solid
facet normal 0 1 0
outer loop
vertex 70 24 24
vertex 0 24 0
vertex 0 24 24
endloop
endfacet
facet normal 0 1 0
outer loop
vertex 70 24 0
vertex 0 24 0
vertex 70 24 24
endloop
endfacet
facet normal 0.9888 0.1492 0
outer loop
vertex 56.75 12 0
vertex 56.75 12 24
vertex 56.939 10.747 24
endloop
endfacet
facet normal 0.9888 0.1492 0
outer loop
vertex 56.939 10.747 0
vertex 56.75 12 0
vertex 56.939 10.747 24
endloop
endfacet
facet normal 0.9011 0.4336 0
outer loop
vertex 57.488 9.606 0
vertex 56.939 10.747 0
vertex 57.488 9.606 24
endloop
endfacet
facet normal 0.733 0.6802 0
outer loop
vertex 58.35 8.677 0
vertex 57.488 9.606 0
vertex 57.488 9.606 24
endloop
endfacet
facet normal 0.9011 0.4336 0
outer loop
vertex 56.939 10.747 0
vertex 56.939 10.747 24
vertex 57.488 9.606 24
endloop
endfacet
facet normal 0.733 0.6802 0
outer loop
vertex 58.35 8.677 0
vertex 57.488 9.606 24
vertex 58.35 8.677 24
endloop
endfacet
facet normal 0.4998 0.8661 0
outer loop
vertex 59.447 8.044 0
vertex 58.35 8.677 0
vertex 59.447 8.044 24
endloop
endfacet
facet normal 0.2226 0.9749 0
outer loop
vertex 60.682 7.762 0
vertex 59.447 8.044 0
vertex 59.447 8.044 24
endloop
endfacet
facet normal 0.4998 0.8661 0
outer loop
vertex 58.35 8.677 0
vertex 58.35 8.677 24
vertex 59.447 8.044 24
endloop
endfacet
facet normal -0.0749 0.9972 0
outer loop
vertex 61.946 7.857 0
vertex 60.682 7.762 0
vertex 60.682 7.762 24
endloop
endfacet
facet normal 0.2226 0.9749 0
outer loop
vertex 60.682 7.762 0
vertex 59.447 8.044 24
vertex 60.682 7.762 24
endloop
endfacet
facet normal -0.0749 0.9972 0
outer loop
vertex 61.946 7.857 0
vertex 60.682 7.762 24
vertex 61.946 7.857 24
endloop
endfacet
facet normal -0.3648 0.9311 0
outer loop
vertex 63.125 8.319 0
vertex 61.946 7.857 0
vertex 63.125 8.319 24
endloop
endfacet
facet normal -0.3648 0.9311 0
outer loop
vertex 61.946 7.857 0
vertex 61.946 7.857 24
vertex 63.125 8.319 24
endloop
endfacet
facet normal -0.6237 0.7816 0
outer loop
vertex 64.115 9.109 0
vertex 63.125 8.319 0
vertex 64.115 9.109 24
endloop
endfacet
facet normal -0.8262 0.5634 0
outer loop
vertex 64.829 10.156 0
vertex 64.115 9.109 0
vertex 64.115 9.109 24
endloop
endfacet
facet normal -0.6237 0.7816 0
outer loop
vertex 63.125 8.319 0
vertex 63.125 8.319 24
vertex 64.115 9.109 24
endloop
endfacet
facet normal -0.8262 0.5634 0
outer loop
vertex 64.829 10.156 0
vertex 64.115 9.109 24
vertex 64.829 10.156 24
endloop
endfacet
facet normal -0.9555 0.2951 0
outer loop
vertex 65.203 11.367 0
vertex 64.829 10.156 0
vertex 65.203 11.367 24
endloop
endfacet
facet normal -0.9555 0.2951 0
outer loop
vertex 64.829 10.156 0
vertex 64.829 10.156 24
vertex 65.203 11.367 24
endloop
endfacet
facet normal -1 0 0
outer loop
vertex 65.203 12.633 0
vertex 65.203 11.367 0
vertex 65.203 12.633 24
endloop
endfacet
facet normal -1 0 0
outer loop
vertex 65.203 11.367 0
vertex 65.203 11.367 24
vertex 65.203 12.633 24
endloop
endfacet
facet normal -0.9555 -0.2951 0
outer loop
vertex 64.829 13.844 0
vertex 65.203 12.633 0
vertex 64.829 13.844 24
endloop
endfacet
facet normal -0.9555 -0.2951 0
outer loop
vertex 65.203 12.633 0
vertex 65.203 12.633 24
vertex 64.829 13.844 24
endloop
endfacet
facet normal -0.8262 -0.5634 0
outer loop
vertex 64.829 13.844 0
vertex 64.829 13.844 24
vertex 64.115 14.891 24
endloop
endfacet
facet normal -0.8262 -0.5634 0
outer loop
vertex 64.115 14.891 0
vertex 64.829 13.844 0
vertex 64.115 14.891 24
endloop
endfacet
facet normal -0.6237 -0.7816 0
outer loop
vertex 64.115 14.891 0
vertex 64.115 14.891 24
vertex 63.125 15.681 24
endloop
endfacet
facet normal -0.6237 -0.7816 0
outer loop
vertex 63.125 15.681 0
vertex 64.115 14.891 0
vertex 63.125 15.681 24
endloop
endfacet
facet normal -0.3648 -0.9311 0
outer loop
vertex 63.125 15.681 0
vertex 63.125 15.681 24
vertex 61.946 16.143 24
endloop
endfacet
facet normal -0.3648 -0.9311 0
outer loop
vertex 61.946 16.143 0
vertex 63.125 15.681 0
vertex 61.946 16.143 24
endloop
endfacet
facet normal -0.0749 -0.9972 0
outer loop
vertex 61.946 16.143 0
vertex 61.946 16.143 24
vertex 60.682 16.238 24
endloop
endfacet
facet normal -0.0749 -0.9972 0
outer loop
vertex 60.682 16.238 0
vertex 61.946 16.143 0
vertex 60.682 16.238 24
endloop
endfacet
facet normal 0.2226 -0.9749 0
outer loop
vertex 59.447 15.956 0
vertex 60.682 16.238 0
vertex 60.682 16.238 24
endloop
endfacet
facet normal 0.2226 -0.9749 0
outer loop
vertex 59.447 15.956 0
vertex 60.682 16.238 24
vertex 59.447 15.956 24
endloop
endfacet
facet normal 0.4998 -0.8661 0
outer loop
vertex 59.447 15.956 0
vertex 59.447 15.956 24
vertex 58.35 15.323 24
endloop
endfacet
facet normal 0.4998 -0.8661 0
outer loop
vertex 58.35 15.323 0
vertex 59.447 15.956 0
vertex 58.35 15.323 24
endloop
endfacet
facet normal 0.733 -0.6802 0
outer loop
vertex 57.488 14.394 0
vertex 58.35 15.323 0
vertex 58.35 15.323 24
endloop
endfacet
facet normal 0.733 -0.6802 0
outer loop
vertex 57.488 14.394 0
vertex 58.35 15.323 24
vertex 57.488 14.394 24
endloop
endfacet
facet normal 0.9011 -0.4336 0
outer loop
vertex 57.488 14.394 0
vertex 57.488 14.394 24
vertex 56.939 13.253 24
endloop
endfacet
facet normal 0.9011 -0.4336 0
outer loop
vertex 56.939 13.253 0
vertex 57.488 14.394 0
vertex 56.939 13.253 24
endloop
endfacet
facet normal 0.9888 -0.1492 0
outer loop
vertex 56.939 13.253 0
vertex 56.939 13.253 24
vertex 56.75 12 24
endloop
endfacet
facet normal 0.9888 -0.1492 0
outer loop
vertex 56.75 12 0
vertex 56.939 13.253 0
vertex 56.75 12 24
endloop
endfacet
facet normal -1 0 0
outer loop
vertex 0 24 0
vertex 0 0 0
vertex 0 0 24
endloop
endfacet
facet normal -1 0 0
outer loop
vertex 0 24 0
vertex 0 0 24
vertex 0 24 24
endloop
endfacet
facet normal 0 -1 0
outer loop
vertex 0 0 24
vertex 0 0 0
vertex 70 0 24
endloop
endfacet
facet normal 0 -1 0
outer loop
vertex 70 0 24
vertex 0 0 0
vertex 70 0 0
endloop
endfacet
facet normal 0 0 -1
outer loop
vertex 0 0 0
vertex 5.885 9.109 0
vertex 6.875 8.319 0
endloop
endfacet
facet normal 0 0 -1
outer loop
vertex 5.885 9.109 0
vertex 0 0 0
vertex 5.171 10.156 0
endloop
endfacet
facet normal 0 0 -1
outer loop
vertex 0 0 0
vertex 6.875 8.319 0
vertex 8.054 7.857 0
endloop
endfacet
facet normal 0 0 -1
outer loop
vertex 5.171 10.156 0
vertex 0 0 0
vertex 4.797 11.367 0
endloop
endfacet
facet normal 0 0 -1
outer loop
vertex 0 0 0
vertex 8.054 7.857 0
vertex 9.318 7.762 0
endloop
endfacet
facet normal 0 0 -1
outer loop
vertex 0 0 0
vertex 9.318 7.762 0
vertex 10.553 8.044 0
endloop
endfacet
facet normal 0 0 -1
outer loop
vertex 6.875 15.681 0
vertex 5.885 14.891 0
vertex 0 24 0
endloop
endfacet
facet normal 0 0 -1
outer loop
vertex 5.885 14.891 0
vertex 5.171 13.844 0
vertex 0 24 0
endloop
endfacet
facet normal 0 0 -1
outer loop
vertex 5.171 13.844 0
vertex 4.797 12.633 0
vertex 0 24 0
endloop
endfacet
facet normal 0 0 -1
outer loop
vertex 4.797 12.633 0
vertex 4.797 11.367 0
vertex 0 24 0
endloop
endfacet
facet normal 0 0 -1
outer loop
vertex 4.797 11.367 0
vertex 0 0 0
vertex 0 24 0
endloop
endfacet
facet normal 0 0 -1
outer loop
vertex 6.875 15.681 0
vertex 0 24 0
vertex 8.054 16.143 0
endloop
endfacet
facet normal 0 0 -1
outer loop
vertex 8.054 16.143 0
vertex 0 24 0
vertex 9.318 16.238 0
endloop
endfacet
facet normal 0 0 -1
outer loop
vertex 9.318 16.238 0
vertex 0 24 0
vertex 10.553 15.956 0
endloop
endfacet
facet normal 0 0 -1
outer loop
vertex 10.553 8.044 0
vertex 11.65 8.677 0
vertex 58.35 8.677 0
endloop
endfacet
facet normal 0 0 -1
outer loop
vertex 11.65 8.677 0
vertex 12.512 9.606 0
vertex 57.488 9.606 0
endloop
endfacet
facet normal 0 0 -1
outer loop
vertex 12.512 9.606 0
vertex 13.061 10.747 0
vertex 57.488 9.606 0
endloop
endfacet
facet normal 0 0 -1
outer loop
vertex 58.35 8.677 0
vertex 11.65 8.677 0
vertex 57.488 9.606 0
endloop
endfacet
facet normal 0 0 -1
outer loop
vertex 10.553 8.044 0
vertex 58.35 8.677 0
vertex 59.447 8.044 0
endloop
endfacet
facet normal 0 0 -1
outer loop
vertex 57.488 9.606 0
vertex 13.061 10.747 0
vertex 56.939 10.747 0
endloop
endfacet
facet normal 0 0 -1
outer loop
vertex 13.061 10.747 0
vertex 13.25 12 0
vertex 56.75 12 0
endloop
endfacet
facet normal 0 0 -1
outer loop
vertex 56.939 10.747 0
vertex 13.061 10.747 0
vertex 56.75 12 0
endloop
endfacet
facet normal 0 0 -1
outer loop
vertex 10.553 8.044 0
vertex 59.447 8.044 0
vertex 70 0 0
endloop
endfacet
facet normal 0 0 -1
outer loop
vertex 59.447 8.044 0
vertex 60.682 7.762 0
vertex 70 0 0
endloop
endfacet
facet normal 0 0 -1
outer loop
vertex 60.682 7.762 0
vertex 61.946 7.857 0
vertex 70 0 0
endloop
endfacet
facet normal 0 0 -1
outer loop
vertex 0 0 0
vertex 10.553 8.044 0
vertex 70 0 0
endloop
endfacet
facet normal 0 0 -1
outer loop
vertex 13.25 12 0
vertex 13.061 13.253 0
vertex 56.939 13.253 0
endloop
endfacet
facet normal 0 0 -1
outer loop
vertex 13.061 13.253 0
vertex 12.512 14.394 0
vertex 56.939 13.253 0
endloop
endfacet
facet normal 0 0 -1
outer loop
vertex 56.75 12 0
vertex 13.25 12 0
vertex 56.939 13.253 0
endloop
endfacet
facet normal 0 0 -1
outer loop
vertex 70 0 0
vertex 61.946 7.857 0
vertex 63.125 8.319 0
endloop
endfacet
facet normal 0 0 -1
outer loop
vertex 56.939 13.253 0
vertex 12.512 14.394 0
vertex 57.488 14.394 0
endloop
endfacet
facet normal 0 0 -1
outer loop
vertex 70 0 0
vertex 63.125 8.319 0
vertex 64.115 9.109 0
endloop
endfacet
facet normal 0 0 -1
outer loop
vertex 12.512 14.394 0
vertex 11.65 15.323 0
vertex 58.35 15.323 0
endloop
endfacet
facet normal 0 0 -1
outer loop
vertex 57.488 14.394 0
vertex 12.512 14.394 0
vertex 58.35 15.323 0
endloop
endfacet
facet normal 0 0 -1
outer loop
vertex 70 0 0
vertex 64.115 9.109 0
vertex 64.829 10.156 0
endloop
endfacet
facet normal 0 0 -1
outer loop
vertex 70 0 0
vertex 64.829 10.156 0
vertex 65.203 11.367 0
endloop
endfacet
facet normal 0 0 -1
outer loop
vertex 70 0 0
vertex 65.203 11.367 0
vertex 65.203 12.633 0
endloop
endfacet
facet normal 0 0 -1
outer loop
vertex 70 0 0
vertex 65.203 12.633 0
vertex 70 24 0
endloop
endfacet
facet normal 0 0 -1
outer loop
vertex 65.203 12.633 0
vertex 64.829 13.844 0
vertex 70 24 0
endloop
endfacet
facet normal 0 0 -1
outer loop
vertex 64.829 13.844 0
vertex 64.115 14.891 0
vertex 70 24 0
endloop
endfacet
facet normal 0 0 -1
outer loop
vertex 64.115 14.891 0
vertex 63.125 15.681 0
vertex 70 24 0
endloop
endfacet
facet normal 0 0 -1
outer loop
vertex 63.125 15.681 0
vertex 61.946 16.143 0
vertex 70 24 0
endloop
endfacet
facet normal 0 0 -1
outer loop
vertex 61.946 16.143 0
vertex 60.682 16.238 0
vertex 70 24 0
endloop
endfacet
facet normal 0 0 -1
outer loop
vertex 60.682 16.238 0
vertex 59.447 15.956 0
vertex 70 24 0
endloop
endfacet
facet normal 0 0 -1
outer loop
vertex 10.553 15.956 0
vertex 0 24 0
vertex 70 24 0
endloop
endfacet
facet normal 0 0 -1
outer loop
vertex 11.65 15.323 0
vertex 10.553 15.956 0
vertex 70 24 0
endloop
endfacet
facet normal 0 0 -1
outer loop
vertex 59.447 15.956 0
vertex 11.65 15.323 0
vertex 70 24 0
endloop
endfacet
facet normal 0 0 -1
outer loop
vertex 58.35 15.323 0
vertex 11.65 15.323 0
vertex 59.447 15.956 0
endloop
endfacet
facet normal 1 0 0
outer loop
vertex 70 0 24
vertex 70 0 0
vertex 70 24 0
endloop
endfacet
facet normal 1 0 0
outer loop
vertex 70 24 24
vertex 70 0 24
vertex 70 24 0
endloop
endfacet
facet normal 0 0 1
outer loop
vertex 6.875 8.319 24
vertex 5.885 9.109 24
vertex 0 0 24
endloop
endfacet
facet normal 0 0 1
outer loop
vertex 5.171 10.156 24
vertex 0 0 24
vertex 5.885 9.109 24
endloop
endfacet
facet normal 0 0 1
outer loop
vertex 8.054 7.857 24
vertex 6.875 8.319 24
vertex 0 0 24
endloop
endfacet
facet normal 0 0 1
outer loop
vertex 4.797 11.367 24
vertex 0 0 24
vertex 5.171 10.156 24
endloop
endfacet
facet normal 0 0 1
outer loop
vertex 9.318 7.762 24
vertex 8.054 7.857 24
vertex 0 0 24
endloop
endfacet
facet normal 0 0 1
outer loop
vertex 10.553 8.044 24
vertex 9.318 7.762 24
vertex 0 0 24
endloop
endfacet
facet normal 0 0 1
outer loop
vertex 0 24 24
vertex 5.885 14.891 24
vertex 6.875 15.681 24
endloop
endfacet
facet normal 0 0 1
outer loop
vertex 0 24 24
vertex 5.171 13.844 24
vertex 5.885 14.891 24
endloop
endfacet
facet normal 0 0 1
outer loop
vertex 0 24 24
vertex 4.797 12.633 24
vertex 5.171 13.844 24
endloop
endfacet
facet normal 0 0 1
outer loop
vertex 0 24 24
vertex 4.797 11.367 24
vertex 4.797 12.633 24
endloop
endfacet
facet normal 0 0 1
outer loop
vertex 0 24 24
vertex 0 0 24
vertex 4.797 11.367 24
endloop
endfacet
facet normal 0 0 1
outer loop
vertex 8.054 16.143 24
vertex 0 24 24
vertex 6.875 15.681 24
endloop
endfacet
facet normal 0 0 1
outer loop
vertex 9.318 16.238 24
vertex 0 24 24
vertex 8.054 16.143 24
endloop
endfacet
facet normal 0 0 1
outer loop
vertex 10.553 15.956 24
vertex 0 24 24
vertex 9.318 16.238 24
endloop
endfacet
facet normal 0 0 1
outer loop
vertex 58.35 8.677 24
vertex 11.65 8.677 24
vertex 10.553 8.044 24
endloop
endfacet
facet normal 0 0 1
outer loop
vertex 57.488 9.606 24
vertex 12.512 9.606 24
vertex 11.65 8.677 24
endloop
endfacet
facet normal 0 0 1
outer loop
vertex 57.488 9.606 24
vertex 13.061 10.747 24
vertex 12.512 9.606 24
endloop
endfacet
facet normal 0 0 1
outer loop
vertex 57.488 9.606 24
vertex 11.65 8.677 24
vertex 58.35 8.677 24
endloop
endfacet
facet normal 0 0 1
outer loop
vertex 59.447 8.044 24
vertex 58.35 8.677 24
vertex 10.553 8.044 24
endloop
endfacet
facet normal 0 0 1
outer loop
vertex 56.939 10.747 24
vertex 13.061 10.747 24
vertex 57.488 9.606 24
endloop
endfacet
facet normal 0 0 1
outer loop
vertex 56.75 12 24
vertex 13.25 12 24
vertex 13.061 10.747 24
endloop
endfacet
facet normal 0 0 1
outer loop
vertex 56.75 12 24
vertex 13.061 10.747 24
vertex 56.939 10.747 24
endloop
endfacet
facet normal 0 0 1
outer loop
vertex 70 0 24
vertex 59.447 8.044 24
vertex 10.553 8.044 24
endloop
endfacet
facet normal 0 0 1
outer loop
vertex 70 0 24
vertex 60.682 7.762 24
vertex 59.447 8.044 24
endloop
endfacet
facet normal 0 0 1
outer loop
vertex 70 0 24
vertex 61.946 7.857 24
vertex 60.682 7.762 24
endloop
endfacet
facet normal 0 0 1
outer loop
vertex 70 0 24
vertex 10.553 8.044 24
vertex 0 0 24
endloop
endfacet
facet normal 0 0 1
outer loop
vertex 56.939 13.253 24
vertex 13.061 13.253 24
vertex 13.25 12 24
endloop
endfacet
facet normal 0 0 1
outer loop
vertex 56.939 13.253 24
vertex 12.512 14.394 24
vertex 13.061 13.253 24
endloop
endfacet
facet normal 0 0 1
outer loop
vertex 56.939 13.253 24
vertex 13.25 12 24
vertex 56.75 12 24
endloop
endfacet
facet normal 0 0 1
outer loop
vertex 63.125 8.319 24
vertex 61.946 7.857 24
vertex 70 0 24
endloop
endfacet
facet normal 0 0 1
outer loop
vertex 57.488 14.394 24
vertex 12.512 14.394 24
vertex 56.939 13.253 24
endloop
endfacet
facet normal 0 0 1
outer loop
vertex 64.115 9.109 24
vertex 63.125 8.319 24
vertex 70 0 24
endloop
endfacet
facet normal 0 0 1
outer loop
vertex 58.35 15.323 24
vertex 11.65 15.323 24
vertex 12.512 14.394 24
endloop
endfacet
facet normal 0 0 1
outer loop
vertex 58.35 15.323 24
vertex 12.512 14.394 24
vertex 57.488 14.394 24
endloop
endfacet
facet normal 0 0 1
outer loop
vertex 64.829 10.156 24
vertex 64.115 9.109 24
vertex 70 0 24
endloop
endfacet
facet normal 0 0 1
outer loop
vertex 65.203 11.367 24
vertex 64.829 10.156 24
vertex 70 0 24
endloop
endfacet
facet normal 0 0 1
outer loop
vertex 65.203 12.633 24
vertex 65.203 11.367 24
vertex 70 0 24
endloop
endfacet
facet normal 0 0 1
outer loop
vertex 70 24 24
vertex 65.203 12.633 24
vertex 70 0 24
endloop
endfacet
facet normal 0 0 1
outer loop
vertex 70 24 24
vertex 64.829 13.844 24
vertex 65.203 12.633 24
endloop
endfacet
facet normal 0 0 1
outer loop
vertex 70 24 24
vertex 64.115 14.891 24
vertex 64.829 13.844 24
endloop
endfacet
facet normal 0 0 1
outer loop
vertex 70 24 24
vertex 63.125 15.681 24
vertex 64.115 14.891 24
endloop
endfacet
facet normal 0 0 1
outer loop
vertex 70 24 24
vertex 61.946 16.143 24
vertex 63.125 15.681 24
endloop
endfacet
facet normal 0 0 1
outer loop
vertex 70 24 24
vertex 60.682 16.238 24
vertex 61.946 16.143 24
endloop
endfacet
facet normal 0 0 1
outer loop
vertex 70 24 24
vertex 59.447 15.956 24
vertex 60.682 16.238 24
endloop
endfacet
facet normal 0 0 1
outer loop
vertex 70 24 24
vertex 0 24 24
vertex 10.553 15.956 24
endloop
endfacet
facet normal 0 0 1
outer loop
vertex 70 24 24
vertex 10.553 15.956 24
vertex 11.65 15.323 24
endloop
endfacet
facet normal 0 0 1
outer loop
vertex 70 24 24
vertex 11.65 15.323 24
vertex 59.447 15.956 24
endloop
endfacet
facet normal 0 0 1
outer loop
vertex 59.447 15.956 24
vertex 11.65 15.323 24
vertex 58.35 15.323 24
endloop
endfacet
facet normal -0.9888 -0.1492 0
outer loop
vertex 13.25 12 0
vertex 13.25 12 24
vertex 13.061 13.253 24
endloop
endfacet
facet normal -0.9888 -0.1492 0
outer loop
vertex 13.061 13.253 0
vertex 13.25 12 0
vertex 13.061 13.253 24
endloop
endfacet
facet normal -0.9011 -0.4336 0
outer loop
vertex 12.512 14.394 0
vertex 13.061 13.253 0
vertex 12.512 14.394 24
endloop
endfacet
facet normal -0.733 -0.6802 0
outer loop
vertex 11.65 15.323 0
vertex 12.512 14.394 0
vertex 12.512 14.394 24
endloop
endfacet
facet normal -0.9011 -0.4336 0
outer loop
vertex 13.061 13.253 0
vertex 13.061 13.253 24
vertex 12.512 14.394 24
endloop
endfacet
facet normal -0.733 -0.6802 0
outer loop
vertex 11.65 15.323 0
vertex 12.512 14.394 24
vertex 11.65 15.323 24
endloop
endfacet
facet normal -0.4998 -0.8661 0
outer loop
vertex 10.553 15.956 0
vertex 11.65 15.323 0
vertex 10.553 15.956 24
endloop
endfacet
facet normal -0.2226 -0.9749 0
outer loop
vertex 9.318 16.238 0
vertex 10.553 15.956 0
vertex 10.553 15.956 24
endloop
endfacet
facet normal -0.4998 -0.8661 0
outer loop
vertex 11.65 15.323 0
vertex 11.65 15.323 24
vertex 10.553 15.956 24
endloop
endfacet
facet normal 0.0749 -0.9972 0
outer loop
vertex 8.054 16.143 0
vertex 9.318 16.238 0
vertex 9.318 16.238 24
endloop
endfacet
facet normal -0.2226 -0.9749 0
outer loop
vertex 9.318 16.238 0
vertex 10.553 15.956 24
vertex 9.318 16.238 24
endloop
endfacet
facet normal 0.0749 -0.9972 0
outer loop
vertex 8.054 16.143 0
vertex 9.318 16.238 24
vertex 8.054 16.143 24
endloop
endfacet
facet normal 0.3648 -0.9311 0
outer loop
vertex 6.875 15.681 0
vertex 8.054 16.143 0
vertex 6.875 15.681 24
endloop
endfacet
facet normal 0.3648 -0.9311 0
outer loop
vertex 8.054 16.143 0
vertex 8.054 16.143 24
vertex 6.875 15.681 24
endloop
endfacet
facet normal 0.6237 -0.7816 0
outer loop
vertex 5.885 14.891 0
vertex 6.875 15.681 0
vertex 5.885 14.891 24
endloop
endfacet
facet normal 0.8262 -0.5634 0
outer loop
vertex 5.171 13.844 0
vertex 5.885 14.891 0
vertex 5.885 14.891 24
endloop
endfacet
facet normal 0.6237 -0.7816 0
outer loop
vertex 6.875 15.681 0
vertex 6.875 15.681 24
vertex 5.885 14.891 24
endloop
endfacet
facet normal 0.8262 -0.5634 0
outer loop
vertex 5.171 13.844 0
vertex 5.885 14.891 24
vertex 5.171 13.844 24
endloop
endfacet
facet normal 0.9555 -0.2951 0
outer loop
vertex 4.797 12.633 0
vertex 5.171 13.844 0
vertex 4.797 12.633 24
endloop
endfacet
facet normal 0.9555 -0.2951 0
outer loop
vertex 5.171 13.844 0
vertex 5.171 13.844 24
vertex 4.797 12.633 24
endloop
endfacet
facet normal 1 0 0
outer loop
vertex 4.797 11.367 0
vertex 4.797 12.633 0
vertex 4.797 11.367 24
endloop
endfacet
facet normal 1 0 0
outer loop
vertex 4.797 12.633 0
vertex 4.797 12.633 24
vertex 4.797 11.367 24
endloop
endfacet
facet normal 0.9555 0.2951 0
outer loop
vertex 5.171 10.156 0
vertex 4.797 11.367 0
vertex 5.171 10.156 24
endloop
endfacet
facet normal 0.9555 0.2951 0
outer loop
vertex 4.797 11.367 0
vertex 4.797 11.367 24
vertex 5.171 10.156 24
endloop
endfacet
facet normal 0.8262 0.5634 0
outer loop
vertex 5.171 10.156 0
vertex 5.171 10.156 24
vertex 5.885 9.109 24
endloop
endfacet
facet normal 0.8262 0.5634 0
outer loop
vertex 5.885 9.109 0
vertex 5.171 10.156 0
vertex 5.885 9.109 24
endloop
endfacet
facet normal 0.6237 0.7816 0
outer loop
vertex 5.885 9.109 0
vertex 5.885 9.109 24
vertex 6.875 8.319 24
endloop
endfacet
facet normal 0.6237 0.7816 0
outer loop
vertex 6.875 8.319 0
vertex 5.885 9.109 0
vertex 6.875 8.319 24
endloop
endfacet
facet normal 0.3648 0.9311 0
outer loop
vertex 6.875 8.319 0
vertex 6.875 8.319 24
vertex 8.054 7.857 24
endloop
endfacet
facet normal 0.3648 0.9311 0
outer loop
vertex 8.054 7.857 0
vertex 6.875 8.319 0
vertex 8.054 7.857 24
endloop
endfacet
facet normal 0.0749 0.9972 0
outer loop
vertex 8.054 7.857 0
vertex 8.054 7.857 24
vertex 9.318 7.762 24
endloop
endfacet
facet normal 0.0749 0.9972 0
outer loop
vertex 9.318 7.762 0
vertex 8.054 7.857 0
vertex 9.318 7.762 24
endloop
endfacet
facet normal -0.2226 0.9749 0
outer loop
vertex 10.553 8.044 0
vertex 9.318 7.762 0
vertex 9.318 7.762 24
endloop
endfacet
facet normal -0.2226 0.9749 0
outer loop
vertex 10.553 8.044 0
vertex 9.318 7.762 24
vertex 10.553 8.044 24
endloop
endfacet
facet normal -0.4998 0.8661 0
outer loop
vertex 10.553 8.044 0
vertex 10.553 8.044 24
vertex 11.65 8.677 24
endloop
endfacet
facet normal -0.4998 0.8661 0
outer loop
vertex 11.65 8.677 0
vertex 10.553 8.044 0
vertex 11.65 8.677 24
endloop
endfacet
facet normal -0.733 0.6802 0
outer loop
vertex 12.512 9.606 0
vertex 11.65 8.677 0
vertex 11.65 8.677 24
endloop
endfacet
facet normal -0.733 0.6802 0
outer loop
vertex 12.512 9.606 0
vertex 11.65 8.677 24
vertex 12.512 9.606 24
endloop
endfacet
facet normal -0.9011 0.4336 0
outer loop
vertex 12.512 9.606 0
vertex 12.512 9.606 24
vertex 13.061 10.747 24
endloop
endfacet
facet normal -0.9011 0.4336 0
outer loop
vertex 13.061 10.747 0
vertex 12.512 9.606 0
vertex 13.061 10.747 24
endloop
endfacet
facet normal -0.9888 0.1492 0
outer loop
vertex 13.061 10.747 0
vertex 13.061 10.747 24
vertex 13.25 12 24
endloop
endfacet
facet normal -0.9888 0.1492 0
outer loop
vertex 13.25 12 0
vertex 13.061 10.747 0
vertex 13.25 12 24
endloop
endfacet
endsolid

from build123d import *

# Parameters (mm, degrees)
SKETCH_1_W          = 70
SKETCH_1_H          = 24
EXTRUDE_1_DEPTH     = 24
SKETCH_2_R          = 4.25
CUT_EXTRUDE_1_DEPTH = 78.794601355


with BuildPart() as part:
    # 草图1 → 凸台-拉伸1 (new body)
    with BuildSketch(Plane.XY):
        with Locations((35, 12)):
            Rectangle(SKETCH_1_W, SKETCH_1_H)
    extrude(amount=EXTRUDE_1_DEPTH)

    # 草图2 → 切除-拉伸1 (cut, through all)
    with BuildSketch(Plane.XY.offset(24)):
        with Locations((9, 12)):
            Circle(SKETCH_2_R)
        with Locations(Location((61, 12, 0), (0, 0, 180))):
            Circle(SKETCH_2_R)
    extrude(amount=-CUT_EXTRUDE_1_DEPTH, mode=Mode.SUBTRACT)


solid = part.part
